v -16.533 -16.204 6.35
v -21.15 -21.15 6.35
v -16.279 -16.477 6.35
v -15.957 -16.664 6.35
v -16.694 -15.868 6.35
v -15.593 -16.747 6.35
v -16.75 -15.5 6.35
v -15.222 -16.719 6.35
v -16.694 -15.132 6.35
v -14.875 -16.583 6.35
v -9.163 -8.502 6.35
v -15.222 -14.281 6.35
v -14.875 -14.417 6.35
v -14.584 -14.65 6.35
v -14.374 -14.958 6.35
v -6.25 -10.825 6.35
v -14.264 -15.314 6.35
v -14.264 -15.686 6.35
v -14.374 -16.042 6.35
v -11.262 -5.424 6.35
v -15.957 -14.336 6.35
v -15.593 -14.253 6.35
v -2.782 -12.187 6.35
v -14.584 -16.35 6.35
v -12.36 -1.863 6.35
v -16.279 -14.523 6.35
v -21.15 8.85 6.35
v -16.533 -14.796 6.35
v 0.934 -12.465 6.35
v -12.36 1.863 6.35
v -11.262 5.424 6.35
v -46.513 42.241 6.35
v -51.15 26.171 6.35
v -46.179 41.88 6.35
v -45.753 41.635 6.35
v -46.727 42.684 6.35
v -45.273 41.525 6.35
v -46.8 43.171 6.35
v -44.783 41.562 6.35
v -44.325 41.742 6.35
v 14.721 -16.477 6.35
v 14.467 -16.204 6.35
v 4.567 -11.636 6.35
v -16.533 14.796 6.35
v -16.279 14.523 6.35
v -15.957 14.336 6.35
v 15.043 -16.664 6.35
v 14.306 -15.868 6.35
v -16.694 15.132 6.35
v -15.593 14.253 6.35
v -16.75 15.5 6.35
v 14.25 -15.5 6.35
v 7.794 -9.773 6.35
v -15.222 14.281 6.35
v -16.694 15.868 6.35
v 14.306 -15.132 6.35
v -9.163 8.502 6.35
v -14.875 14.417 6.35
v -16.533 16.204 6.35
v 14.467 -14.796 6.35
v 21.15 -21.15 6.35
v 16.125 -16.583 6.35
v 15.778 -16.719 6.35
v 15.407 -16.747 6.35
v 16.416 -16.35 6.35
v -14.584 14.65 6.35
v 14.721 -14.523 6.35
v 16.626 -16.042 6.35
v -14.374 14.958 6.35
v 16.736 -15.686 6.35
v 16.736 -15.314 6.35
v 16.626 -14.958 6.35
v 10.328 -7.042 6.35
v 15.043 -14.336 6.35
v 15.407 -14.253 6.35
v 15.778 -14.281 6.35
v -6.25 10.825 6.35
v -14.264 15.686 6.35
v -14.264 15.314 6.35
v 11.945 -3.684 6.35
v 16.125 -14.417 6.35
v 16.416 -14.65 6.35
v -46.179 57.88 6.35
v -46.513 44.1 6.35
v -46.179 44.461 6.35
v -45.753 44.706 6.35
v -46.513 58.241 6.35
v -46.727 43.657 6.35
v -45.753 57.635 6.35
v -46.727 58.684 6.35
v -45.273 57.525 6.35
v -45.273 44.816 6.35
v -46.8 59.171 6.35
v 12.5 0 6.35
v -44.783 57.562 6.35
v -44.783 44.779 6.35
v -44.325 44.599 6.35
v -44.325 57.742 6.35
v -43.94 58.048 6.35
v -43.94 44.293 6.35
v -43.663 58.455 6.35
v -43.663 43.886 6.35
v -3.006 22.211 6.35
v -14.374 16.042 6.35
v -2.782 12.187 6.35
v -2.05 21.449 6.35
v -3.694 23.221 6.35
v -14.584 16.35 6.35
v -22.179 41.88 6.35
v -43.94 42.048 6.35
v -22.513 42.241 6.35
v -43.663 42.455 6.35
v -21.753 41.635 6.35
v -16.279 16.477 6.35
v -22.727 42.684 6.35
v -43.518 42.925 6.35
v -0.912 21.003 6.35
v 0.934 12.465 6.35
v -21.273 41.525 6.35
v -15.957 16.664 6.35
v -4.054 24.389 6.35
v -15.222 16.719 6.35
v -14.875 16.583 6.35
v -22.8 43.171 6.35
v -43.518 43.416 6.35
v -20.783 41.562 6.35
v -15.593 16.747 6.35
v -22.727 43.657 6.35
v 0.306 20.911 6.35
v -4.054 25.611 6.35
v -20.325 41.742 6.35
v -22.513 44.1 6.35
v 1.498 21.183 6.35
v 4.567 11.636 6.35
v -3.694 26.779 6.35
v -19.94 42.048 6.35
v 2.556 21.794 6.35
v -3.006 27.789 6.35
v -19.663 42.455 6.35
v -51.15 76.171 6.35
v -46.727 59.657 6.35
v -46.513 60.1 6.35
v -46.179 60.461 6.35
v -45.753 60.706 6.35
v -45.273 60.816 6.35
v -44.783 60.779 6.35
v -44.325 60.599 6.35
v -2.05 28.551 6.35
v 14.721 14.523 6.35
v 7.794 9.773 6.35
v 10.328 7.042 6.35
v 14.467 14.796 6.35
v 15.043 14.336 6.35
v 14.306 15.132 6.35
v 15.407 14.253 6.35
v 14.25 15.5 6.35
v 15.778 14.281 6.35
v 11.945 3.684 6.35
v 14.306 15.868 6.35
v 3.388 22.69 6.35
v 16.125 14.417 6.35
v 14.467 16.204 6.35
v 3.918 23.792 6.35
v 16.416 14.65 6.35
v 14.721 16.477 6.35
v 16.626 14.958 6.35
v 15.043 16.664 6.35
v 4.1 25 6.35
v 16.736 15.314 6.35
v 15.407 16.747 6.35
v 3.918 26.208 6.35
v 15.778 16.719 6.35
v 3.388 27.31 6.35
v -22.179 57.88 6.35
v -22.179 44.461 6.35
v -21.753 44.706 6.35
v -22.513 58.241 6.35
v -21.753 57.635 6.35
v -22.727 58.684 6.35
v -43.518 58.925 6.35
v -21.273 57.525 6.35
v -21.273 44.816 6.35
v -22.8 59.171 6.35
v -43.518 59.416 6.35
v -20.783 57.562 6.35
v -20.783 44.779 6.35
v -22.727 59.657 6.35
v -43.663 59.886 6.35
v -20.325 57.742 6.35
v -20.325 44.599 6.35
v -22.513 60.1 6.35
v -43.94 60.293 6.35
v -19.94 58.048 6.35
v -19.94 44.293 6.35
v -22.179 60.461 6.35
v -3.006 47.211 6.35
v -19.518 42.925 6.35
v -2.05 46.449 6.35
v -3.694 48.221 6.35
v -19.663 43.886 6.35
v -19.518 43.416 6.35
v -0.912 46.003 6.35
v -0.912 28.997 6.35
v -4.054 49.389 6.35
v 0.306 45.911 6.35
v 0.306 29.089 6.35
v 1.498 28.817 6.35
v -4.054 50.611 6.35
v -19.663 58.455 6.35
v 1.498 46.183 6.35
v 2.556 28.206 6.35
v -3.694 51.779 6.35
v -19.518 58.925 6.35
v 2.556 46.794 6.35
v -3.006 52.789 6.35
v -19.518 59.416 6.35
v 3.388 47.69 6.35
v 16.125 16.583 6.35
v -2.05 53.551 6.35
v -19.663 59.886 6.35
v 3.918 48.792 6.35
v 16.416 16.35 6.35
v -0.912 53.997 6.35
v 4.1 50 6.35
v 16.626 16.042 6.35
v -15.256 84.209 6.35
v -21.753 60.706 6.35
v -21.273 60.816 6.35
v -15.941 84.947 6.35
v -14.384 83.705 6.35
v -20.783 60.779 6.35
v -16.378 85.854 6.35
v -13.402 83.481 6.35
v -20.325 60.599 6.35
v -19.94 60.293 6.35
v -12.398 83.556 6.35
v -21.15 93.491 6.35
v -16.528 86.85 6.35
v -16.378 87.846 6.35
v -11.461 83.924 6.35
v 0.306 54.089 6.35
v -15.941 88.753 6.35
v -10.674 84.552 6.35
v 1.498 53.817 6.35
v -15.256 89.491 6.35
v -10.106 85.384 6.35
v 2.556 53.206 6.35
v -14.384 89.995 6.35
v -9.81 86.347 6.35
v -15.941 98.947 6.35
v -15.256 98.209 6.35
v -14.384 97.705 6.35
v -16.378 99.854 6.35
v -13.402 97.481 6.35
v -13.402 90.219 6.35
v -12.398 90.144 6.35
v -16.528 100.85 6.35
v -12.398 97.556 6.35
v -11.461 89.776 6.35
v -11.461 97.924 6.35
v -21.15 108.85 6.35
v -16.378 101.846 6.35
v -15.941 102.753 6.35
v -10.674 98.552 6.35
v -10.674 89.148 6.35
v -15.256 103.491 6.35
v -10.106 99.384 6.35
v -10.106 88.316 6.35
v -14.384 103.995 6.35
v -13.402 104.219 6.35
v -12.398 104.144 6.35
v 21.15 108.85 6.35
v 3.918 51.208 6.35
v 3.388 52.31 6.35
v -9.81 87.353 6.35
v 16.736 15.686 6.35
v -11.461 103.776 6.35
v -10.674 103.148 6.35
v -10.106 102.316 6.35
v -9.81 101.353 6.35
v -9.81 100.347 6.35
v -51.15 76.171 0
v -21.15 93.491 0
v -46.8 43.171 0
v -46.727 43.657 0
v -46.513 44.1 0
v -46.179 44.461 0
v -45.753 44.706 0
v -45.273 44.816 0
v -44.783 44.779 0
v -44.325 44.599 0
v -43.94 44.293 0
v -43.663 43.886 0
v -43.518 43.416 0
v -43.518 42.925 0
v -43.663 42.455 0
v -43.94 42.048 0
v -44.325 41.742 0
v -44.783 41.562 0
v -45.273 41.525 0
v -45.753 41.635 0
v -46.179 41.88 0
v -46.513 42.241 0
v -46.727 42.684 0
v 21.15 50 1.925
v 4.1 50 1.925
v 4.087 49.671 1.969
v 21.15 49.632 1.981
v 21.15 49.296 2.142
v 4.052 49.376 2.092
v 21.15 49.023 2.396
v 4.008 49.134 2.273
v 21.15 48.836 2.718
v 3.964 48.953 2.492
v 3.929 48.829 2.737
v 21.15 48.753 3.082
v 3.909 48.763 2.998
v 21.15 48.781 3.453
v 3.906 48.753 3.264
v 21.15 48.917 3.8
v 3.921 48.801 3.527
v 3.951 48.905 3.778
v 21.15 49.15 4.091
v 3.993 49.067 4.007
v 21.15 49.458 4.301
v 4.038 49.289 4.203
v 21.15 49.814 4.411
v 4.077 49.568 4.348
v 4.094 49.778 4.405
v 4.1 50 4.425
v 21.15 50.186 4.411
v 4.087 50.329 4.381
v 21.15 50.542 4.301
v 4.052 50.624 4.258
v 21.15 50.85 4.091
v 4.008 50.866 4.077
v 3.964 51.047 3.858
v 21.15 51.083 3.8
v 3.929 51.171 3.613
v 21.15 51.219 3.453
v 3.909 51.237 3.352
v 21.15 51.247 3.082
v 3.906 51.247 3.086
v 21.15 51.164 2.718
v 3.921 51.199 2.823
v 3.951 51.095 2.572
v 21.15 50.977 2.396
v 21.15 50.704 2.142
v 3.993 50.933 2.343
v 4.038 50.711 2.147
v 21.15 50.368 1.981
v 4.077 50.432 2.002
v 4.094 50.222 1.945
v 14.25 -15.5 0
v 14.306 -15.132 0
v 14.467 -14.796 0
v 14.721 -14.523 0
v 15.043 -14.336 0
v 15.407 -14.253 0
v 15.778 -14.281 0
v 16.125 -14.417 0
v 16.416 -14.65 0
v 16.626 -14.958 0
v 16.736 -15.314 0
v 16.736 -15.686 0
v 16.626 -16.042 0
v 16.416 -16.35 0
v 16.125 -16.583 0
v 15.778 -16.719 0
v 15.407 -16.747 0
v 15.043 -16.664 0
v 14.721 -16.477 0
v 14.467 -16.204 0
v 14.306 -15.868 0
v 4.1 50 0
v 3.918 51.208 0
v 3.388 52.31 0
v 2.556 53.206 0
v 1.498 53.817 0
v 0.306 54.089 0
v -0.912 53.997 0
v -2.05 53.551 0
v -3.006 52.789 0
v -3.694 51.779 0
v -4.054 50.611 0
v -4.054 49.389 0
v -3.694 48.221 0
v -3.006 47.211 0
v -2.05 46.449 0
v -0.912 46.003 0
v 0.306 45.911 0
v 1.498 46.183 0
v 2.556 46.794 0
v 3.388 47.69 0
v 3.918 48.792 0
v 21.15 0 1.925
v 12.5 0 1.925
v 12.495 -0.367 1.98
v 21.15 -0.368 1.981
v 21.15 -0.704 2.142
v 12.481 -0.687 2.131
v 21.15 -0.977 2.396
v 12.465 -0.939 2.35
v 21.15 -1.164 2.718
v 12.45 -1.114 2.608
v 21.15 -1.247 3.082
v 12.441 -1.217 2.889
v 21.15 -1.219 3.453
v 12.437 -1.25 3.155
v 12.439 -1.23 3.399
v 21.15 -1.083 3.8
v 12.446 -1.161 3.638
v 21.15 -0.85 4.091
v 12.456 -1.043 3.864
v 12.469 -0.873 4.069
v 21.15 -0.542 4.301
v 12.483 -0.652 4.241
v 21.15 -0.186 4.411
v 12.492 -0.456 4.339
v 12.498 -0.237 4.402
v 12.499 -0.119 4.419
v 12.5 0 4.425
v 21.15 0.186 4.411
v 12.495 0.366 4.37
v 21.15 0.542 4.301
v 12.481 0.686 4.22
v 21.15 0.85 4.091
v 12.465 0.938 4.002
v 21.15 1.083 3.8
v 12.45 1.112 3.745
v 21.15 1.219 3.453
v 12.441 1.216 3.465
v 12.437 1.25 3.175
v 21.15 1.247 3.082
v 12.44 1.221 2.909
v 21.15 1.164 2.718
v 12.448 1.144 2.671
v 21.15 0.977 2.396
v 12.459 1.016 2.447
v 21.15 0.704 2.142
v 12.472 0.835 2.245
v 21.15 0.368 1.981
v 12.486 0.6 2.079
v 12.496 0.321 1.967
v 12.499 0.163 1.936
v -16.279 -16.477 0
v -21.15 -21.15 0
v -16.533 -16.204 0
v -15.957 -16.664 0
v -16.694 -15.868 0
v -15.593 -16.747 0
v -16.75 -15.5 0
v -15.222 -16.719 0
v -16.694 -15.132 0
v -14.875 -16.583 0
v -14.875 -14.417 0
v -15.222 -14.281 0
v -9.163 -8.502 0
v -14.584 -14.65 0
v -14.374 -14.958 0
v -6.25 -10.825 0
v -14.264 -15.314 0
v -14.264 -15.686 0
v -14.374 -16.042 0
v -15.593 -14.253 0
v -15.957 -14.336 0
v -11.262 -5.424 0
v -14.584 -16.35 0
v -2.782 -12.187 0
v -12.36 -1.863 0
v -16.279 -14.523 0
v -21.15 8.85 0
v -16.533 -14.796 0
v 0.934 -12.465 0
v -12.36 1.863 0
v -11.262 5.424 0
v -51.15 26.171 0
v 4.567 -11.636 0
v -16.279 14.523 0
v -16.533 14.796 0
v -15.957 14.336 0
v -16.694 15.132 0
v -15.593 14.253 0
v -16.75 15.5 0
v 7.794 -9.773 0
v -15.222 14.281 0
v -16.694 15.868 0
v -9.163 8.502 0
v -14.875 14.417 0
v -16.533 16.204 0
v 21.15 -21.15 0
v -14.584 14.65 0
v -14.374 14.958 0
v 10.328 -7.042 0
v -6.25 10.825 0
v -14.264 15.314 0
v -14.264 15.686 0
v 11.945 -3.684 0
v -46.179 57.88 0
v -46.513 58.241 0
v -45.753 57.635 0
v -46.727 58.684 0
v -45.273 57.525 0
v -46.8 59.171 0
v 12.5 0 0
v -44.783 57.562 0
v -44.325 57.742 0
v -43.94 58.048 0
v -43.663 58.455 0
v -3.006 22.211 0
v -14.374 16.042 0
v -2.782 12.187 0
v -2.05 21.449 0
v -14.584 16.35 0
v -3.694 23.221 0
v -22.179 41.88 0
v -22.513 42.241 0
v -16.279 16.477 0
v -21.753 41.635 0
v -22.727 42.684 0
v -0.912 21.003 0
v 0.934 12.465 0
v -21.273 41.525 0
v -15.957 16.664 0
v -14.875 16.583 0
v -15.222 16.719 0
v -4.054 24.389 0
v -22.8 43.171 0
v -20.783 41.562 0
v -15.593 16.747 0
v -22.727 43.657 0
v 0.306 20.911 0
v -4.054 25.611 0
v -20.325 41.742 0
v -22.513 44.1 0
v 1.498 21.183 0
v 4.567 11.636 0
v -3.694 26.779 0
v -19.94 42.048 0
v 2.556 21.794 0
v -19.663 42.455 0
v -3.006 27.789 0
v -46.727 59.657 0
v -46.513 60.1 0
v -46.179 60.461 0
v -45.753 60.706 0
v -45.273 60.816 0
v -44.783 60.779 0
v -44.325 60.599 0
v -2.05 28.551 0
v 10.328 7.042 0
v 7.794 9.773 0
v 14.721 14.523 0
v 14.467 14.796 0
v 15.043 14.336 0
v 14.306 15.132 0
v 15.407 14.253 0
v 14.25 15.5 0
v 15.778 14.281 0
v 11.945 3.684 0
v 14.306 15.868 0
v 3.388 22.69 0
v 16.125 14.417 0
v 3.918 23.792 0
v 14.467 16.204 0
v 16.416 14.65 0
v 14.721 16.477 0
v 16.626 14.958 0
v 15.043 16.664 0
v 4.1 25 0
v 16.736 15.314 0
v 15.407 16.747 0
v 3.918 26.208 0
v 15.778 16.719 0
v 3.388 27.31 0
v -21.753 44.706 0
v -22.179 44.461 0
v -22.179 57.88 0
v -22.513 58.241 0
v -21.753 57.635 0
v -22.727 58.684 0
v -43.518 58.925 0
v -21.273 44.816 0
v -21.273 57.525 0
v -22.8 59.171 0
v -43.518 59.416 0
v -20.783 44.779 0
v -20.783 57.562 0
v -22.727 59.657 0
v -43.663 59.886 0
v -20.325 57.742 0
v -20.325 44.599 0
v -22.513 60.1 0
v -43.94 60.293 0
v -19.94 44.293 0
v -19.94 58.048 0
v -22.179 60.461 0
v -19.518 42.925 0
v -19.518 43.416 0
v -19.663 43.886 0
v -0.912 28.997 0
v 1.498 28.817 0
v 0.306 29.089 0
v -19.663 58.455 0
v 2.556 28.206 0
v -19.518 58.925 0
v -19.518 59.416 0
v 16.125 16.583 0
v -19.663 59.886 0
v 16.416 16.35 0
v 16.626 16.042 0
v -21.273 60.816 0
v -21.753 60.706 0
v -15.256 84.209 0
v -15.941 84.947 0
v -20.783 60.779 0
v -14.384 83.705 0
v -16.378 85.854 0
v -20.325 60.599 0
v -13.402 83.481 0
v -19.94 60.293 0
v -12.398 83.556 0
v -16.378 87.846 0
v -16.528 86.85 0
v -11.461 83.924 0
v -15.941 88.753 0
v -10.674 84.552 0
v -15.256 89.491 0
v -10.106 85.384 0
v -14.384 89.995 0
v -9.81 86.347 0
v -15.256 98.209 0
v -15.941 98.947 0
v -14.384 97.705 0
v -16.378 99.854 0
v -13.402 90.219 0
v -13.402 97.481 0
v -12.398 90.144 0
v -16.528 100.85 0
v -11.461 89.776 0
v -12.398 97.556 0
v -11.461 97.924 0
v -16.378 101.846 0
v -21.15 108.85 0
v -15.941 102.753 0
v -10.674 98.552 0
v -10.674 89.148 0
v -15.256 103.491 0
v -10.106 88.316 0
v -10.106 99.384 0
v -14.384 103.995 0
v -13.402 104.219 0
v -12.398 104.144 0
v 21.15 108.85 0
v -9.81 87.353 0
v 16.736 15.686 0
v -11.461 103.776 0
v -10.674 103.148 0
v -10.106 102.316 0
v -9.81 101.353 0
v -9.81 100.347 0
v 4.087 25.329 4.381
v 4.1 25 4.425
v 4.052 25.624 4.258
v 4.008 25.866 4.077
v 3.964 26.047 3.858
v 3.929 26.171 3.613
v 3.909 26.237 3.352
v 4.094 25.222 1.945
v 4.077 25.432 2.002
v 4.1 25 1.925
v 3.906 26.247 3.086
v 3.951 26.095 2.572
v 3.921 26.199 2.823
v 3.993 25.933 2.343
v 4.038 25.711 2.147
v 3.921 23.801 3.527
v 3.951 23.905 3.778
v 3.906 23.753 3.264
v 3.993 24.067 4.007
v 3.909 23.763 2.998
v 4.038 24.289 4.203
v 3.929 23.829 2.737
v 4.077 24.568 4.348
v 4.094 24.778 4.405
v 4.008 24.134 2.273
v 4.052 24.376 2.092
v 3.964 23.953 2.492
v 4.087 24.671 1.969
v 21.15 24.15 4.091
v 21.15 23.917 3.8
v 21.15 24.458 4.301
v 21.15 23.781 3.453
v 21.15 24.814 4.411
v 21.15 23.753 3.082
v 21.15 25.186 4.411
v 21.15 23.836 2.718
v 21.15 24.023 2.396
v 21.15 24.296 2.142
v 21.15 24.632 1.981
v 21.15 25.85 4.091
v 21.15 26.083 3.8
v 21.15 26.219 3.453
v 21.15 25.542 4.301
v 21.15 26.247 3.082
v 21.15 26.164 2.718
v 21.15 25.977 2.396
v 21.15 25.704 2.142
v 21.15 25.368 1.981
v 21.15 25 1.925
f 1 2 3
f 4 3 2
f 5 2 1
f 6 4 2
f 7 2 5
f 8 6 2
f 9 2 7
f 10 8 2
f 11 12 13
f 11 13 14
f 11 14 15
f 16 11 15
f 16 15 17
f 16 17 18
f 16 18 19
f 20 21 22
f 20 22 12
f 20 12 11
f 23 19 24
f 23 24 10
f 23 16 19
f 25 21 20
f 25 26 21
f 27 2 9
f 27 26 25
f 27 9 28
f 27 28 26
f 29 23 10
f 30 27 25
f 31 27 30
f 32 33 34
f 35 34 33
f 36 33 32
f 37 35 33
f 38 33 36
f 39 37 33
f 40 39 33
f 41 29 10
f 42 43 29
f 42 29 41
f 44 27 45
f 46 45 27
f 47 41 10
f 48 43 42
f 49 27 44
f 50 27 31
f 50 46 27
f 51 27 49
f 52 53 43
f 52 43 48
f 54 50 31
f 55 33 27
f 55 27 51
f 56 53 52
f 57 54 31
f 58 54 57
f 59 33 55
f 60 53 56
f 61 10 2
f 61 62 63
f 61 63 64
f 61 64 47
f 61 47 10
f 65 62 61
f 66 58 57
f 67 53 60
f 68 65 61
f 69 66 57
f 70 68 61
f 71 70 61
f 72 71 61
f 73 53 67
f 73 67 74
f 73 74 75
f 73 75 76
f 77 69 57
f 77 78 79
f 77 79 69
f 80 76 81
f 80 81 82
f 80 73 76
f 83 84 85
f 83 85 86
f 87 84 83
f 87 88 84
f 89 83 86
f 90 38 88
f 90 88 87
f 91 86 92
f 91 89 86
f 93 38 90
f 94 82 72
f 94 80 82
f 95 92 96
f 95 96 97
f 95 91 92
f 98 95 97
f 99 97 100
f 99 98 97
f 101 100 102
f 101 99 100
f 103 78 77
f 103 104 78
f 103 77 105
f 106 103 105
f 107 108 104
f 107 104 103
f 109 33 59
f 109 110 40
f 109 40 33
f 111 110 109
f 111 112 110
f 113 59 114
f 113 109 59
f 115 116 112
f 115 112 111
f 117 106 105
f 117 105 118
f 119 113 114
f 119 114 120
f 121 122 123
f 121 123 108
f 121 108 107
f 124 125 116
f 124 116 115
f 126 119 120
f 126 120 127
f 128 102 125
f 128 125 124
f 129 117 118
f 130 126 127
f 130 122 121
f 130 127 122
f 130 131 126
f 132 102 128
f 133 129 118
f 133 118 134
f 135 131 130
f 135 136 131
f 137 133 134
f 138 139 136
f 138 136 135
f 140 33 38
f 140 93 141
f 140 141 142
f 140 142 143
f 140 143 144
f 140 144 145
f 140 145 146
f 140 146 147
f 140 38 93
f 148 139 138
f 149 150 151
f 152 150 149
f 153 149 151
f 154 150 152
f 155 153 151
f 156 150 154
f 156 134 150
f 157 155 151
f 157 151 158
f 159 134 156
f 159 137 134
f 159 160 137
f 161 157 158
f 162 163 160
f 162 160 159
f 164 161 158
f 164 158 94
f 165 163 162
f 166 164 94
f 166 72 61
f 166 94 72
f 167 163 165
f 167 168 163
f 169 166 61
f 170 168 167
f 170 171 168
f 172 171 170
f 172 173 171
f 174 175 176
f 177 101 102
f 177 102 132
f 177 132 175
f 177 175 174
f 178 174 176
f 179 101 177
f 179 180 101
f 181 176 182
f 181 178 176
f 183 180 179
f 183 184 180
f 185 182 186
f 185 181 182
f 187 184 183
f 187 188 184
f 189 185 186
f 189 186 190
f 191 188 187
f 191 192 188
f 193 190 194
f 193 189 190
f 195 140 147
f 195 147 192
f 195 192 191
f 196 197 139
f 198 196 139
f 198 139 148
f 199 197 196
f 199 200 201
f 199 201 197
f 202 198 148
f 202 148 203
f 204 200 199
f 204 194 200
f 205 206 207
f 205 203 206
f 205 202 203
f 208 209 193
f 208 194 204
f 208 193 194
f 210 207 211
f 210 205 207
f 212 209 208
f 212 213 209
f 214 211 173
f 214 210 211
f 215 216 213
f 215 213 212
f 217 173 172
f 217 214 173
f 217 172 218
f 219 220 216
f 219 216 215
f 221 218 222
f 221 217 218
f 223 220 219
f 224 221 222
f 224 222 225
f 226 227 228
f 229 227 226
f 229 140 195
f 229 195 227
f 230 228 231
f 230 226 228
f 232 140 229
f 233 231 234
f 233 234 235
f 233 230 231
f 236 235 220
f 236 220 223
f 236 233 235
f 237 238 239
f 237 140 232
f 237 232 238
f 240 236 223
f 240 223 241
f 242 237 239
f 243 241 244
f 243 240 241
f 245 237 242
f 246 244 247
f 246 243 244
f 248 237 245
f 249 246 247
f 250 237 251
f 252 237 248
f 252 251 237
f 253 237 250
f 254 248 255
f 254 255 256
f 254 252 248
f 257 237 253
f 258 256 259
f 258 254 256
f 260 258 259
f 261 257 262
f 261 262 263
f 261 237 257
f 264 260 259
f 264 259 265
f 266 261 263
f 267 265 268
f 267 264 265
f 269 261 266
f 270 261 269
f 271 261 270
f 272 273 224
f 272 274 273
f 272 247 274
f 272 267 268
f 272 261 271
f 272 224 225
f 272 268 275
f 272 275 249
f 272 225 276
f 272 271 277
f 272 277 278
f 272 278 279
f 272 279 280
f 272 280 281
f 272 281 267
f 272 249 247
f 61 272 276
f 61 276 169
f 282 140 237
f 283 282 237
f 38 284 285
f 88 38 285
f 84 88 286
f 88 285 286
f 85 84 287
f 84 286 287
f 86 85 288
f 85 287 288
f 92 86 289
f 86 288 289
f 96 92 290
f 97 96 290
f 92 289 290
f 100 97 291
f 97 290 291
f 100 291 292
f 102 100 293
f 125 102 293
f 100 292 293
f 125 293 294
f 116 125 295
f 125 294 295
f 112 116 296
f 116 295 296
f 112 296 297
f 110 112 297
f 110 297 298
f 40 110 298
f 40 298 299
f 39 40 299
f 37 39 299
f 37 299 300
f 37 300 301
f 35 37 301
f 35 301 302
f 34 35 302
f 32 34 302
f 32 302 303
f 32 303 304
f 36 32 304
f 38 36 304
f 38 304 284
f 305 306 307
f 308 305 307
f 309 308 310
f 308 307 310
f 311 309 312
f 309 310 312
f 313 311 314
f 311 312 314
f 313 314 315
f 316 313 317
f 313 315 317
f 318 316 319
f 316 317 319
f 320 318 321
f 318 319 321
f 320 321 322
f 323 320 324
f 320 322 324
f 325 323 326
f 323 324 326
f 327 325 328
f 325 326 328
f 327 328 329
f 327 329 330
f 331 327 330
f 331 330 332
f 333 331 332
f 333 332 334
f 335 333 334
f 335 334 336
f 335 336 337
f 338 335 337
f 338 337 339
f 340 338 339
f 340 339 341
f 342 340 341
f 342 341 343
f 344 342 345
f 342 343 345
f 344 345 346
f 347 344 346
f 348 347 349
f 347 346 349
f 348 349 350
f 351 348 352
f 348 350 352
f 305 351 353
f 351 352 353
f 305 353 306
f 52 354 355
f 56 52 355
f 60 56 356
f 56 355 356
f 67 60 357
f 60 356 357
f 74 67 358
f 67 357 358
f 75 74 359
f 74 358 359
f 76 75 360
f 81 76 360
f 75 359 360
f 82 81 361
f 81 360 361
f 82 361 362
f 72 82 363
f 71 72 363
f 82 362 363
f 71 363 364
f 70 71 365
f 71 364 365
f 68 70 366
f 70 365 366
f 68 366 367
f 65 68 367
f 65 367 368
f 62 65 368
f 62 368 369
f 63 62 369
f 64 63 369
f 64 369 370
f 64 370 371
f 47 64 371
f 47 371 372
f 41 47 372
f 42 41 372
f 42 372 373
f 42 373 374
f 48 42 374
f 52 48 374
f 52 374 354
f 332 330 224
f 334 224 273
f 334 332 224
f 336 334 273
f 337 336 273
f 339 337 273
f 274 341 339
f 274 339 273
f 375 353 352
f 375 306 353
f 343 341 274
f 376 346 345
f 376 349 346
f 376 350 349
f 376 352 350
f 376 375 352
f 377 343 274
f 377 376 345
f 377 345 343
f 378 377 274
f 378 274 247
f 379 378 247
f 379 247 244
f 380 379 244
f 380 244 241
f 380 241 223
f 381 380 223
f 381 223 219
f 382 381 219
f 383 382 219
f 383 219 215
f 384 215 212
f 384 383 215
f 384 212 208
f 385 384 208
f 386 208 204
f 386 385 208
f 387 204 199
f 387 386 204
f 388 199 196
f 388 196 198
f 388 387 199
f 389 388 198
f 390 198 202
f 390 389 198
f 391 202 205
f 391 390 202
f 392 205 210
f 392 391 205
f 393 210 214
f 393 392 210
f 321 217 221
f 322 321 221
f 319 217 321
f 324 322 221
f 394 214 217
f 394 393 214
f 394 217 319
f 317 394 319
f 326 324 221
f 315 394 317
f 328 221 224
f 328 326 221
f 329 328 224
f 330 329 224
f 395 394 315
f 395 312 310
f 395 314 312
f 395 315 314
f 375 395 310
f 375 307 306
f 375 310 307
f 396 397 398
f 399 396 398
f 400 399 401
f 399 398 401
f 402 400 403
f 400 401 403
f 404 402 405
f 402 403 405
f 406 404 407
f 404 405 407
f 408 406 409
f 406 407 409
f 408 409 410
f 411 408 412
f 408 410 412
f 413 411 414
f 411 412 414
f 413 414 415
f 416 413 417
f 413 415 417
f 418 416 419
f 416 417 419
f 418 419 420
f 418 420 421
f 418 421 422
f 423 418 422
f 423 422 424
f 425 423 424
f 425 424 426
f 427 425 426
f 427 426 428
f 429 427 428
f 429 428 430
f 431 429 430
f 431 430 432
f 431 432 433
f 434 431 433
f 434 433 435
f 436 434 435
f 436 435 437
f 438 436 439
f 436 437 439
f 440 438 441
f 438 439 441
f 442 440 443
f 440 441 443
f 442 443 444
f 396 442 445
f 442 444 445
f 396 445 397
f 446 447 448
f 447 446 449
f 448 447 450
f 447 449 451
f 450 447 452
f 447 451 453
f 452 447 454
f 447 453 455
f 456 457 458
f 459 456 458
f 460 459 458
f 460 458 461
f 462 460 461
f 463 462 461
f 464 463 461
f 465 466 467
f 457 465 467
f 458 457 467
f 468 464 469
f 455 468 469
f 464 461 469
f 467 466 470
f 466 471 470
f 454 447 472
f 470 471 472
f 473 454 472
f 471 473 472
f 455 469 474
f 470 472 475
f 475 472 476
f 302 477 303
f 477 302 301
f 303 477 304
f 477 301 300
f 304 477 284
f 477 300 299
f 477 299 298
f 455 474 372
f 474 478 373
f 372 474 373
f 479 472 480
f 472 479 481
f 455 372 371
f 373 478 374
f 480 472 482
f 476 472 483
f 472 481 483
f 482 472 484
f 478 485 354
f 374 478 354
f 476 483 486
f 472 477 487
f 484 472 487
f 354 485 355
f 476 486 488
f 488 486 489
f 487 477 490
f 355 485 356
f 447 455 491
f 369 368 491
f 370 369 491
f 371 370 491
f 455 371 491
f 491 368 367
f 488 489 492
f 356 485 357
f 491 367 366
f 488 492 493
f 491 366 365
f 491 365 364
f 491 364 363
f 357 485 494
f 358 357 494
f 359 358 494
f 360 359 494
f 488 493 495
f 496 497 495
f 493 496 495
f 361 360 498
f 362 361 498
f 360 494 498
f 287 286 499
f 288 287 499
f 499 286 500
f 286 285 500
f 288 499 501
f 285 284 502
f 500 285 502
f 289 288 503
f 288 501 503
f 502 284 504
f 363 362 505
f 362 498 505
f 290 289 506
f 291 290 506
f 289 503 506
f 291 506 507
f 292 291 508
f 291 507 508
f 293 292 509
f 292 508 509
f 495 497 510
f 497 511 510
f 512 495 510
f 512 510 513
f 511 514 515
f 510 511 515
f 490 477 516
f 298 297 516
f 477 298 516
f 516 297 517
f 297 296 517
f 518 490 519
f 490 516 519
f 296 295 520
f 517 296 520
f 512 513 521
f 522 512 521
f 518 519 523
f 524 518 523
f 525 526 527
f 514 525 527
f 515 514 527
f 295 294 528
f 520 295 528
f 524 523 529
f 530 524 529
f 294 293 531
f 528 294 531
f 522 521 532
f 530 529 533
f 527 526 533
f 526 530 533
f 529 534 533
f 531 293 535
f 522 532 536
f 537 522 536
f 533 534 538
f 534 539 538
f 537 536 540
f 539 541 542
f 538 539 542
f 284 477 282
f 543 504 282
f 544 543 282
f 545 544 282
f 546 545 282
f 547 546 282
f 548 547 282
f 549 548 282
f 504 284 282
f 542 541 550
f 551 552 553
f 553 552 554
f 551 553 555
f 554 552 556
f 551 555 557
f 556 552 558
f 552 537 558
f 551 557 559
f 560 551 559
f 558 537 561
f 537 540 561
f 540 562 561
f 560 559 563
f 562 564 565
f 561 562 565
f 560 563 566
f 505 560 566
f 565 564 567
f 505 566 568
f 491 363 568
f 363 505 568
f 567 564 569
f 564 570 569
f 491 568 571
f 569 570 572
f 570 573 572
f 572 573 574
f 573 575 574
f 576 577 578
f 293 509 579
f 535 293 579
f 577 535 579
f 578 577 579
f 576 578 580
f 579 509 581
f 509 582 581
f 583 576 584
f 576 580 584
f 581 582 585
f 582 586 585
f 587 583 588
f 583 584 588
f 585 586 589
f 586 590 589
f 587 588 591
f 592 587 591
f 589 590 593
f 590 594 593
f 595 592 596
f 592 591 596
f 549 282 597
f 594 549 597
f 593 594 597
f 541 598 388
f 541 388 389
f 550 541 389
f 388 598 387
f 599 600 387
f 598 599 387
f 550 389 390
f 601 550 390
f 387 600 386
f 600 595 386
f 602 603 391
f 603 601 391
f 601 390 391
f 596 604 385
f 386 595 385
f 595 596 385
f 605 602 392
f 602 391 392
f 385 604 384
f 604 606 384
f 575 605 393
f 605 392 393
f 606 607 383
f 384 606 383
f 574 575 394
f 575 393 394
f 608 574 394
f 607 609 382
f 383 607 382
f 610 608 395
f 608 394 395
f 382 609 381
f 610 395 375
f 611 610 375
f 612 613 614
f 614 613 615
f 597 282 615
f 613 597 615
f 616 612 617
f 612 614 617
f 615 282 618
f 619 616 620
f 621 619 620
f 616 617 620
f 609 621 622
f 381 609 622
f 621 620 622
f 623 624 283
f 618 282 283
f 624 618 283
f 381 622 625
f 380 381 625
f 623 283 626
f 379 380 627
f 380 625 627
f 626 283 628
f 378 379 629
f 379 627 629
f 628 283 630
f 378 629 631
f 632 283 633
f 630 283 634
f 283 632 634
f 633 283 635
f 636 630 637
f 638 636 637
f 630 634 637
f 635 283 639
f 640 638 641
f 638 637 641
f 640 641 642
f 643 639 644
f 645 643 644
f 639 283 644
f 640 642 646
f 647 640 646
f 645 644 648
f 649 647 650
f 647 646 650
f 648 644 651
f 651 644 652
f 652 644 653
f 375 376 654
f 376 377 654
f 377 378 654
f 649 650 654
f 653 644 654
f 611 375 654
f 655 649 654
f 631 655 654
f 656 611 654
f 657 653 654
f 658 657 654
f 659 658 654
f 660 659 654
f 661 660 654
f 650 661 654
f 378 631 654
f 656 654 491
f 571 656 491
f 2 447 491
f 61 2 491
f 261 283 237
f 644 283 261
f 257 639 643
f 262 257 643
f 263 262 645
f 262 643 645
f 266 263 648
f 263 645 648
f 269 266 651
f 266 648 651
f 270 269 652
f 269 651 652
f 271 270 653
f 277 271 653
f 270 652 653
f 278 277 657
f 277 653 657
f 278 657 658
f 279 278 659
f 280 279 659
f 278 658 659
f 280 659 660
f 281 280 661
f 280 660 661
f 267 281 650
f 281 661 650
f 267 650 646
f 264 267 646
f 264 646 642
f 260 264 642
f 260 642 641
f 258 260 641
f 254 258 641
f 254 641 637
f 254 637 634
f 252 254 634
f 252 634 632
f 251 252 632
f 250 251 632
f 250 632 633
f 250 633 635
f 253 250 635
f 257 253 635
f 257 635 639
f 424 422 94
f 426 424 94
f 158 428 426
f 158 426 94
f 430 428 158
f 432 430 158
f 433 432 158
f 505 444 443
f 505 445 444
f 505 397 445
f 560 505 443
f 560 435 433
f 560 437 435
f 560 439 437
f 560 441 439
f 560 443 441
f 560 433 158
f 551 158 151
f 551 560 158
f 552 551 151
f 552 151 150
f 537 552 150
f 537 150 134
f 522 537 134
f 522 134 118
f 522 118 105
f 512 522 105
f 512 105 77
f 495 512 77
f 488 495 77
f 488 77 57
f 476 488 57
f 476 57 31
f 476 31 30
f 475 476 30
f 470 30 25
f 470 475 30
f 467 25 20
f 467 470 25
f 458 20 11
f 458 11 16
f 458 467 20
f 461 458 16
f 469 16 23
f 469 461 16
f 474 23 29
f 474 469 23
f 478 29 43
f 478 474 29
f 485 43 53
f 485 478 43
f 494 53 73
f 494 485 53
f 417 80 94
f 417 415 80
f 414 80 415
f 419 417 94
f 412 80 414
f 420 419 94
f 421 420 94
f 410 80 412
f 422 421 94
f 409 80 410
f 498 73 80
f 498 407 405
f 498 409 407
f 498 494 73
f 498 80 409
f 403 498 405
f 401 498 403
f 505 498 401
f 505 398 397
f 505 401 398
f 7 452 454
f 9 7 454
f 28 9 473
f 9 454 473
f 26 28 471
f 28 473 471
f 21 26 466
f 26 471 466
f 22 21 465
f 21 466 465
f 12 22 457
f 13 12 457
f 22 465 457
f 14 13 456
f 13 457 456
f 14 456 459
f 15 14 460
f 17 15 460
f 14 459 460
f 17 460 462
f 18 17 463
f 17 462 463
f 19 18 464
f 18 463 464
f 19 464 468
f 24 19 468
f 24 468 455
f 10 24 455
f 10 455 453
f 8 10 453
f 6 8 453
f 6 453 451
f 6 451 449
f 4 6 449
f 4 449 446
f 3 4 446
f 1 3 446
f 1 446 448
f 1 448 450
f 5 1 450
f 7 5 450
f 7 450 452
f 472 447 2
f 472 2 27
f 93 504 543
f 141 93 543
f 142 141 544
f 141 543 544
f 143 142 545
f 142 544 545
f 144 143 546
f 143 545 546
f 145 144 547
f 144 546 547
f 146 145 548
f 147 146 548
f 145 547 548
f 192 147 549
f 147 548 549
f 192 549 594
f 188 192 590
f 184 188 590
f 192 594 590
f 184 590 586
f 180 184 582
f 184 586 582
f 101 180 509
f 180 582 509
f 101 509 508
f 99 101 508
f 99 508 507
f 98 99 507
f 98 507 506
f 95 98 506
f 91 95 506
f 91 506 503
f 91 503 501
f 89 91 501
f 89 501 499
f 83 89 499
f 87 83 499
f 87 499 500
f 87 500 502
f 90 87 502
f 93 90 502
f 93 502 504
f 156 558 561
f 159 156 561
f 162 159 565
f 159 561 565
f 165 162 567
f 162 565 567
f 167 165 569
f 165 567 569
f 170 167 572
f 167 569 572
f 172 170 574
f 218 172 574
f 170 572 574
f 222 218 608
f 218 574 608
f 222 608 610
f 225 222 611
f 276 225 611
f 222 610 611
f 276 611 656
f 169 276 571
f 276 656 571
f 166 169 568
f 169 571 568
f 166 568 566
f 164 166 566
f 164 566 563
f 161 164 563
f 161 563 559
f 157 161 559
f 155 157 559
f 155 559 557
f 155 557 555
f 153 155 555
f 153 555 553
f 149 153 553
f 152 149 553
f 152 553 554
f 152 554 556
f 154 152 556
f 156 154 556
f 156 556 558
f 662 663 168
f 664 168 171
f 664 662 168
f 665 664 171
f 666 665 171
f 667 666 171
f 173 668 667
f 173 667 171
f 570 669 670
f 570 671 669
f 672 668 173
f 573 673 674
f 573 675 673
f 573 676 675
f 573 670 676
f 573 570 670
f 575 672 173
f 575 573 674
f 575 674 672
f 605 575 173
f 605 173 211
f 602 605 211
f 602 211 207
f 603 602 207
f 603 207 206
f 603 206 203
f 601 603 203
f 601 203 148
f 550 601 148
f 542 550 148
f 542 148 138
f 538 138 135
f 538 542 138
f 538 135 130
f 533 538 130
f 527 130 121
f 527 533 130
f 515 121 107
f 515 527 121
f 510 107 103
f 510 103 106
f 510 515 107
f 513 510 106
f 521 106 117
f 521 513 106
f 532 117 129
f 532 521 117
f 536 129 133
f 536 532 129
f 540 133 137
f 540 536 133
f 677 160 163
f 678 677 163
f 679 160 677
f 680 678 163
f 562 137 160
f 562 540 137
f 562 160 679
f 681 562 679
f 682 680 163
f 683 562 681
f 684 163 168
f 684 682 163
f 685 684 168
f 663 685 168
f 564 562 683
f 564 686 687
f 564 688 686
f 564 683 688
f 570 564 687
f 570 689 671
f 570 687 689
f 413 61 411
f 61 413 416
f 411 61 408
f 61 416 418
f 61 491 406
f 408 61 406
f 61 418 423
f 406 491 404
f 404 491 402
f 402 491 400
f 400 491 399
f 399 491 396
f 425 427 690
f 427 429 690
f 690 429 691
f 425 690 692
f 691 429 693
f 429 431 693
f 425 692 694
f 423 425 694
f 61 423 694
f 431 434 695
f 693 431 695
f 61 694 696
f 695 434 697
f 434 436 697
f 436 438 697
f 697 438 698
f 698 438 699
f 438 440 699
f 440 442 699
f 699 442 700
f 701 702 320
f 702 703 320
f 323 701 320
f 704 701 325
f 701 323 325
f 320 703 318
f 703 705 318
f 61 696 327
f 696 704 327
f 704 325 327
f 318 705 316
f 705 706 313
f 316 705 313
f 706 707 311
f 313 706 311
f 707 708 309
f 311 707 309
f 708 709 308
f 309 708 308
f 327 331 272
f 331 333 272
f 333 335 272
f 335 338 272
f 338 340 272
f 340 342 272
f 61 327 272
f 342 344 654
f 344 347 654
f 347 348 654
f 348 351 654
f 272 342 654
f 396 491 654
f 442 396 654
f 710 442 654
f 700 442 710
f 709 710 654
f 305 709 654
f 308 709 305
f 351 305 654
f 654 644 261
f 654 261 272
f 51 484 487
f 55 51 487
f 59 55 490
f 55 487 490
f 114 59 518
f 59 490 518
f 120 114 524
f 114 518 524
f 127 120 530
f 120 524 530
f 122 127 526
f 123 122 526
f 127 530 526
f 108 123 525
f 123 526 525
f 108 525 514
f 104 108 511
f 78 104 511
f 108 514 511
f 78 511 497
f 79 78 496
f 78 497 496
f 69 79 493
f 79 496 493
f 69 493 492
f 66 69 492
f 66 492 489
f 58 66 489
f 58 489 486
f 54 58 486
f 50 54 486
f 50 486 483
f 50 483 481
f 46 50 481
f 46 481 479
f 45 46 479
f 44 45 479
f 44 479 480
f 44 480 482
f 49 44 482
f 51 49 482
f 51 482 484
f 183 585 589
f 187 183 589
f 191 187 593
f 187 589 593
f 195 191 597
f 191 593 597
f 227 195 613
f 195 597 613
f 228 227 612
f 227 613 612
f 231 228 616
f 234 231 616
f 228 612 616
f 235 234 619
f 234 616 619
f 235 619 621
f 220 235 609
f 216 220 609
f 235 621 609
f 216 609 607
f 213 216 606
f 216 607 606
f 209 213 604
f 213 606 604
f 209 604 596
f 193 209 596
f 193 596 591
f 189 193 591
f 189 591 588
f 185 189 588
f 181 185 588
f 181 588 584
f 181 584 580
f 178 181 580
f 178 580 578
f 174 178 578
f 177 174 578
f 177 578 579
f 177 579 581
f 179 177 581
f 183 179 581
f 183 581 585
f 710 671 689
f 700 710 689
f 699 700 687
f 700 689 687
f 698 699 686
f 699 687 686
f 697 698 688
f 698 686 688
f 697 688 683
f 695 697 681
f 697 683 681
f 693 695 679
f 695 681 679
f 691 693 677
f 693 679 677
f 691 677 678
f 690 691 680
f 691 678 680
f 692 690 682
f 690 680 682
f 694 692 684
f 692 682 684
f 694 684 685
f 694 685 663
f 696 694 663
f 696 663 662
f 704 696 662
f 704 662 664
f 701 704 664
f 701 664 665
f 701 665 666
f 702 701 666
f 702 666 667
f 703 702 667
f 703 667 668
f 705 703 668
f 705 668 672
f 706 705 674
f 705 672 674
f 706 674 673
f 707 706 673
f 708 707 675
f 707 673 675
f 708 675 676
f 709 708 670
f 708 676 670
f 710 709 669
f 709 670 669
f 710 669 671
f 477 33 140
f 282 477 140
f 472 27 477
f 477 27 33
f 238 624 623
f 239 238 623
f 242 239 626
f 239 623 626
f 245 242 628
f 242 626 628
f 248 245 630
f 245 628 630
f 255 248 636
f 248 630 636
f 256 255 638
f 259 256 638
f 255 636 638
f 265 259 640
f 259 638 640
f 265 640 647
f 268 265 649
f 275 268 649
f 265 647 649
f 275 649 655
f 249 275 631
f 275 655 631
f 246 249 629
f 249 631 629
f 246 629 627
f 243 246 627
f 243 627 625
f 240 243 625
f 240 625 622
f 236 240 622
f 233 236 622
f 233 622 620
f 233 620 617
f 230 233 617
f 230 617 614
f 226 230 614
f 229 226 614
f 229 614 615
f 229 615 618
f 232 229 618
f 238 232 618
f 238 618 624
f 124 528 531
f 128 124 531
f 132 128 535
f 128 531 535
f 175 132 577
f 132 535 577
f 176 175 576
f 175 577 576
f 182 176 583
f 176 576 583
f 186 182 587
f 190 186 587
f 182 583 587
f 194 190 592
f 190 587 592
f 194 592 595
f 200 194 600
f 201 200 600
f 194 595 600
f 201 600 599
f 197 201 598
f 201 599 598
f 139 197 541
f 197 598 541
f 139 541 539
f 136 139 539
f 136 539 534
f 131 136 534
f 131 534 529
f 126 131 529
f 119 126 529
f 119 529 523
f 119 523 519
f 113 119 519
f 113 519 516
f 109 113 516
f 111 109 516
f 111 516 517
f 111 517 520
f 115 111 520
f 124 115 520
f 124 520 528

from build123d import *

# Parameters (mm, degrees)
SKETCH2_W                       = 42.3
SKETCH2_H                       = 130
SKETCH2_R                       = 12.5
SKETCH2_R_2                     = 4.1
BOSS_EXTRUDE1_DEPTH             = 6.35
TAP_DRILL_FOR_M3X0_5_TAP1_D     = 2.5
TAP_DRILL_FOR_M3X0_5_TAP1_DEPTH = 21.15
TAP_DRILL_FOR_M3X0_5_TAP1_TIP   = 0.751075774
TAP_DRILL_FOR_M3X0_5_TAP2_D     = 2.5
F_1_4_CLEARANCE_HOLE1_D         = 6.7564
BOSS_EXTRUDE2_DEPTH             = 6.35
TAP_DRILL_FOR_M4X0_7_TAP1_D     = 3.3


with BuildPart() as part:
    # Sketch2 → Boss-Extrude1 (new body)
    with BuildSketch(Plane.XY):
        with Locations((0, 43.85)):
            Rectangle(SKETCH2_W, SKETCH2_H)
        Circle(SKETCH2_R, mode=Mode.SUBTRACT)
        with Locations((0, 25)):
            Circle(SKETCH2_R_2, mode=Mode.SUBTRACT)
        with Locations((0, 50)):
            Circle(SKETCH2_R_2, mode=Mode.SUBTRACT)
    extrude(amount=BOSS_EXTRUDE1_DEPTH)

    # Tap Drill for M3x0.5 Tap1
    with Locations(Plane(origin=(21.15, 0, 0), x_dir=(0, 0, 1), z_dir=(1, 0, 0))):
        with Locations((3.175, -50), (3.175, 0), (3.175, -25)):
            Hole(TAP_DRILL_FOR_M3X0_5_TAP1_D / 2, depth=TAP_DRILL_FOR_M3X0_5_TAP1_DEPTH)
            with Locations((0, 0, -(TAP_DRILL_FOR_M3X0_5_TAP1_DEPTH + TAP_DRILL_FOR_M3X0_5_TAP1_TIP / 2))):  # 118° drill point
                Cone(0, TAP_DRILL_FOR_M3X0_5_TAP1_D / 2, TAP_DRILL_FOR_M3X0_5_TAP1_TIP, mode=Mode.SUBTRACT)

    # Tap Drill for M3x0.5 Tap2 (through all)
    with Locations(Plane.XY.offset(6.35)):
        with Locations((-15.5, 15.5), (-15.5, -15.5), (15.5, -15.5), (15.5, 15.5)):
            Hole(TAP_DRILL_FOR_M3X0_5_TAP2_D / 2)

    # 1/4 Clearance Hole1 (through all)
    with Locations(Plane.XY.offset(6.35)):
        with Locations((-13.15, 86.85), (-13.15, 100.85)):
            Hole(F_1_4_CLEARANCE_HOLE1_D / 2)

    # Sketch13 → Boss-Extrude2 (add)
    with BuildSketch(Plane.XY.offset(6.35)):
        Polygon((-21.15, 8.85), (-51.15, 26.170508076), (-51.15, 76.170508076), (-21.15, 93.491016151), align=None)
    extrude(amount=-BOSS_EXTRUDE2_DEPTH)

    # Tap Drill for M4x0.7 Tap1 (through all)
    with Locations(Plane.XY.offset(6.35)):
        with Locations((-45.15, 59.170508076), (-21.15, 59.170508076), (-21.15, 43.170508076), (-45.15, 43.170508076)):
            Hole(TAP_DRILL_FOR_M4X0_7_TAP1_D / 2)


solid = part.part
